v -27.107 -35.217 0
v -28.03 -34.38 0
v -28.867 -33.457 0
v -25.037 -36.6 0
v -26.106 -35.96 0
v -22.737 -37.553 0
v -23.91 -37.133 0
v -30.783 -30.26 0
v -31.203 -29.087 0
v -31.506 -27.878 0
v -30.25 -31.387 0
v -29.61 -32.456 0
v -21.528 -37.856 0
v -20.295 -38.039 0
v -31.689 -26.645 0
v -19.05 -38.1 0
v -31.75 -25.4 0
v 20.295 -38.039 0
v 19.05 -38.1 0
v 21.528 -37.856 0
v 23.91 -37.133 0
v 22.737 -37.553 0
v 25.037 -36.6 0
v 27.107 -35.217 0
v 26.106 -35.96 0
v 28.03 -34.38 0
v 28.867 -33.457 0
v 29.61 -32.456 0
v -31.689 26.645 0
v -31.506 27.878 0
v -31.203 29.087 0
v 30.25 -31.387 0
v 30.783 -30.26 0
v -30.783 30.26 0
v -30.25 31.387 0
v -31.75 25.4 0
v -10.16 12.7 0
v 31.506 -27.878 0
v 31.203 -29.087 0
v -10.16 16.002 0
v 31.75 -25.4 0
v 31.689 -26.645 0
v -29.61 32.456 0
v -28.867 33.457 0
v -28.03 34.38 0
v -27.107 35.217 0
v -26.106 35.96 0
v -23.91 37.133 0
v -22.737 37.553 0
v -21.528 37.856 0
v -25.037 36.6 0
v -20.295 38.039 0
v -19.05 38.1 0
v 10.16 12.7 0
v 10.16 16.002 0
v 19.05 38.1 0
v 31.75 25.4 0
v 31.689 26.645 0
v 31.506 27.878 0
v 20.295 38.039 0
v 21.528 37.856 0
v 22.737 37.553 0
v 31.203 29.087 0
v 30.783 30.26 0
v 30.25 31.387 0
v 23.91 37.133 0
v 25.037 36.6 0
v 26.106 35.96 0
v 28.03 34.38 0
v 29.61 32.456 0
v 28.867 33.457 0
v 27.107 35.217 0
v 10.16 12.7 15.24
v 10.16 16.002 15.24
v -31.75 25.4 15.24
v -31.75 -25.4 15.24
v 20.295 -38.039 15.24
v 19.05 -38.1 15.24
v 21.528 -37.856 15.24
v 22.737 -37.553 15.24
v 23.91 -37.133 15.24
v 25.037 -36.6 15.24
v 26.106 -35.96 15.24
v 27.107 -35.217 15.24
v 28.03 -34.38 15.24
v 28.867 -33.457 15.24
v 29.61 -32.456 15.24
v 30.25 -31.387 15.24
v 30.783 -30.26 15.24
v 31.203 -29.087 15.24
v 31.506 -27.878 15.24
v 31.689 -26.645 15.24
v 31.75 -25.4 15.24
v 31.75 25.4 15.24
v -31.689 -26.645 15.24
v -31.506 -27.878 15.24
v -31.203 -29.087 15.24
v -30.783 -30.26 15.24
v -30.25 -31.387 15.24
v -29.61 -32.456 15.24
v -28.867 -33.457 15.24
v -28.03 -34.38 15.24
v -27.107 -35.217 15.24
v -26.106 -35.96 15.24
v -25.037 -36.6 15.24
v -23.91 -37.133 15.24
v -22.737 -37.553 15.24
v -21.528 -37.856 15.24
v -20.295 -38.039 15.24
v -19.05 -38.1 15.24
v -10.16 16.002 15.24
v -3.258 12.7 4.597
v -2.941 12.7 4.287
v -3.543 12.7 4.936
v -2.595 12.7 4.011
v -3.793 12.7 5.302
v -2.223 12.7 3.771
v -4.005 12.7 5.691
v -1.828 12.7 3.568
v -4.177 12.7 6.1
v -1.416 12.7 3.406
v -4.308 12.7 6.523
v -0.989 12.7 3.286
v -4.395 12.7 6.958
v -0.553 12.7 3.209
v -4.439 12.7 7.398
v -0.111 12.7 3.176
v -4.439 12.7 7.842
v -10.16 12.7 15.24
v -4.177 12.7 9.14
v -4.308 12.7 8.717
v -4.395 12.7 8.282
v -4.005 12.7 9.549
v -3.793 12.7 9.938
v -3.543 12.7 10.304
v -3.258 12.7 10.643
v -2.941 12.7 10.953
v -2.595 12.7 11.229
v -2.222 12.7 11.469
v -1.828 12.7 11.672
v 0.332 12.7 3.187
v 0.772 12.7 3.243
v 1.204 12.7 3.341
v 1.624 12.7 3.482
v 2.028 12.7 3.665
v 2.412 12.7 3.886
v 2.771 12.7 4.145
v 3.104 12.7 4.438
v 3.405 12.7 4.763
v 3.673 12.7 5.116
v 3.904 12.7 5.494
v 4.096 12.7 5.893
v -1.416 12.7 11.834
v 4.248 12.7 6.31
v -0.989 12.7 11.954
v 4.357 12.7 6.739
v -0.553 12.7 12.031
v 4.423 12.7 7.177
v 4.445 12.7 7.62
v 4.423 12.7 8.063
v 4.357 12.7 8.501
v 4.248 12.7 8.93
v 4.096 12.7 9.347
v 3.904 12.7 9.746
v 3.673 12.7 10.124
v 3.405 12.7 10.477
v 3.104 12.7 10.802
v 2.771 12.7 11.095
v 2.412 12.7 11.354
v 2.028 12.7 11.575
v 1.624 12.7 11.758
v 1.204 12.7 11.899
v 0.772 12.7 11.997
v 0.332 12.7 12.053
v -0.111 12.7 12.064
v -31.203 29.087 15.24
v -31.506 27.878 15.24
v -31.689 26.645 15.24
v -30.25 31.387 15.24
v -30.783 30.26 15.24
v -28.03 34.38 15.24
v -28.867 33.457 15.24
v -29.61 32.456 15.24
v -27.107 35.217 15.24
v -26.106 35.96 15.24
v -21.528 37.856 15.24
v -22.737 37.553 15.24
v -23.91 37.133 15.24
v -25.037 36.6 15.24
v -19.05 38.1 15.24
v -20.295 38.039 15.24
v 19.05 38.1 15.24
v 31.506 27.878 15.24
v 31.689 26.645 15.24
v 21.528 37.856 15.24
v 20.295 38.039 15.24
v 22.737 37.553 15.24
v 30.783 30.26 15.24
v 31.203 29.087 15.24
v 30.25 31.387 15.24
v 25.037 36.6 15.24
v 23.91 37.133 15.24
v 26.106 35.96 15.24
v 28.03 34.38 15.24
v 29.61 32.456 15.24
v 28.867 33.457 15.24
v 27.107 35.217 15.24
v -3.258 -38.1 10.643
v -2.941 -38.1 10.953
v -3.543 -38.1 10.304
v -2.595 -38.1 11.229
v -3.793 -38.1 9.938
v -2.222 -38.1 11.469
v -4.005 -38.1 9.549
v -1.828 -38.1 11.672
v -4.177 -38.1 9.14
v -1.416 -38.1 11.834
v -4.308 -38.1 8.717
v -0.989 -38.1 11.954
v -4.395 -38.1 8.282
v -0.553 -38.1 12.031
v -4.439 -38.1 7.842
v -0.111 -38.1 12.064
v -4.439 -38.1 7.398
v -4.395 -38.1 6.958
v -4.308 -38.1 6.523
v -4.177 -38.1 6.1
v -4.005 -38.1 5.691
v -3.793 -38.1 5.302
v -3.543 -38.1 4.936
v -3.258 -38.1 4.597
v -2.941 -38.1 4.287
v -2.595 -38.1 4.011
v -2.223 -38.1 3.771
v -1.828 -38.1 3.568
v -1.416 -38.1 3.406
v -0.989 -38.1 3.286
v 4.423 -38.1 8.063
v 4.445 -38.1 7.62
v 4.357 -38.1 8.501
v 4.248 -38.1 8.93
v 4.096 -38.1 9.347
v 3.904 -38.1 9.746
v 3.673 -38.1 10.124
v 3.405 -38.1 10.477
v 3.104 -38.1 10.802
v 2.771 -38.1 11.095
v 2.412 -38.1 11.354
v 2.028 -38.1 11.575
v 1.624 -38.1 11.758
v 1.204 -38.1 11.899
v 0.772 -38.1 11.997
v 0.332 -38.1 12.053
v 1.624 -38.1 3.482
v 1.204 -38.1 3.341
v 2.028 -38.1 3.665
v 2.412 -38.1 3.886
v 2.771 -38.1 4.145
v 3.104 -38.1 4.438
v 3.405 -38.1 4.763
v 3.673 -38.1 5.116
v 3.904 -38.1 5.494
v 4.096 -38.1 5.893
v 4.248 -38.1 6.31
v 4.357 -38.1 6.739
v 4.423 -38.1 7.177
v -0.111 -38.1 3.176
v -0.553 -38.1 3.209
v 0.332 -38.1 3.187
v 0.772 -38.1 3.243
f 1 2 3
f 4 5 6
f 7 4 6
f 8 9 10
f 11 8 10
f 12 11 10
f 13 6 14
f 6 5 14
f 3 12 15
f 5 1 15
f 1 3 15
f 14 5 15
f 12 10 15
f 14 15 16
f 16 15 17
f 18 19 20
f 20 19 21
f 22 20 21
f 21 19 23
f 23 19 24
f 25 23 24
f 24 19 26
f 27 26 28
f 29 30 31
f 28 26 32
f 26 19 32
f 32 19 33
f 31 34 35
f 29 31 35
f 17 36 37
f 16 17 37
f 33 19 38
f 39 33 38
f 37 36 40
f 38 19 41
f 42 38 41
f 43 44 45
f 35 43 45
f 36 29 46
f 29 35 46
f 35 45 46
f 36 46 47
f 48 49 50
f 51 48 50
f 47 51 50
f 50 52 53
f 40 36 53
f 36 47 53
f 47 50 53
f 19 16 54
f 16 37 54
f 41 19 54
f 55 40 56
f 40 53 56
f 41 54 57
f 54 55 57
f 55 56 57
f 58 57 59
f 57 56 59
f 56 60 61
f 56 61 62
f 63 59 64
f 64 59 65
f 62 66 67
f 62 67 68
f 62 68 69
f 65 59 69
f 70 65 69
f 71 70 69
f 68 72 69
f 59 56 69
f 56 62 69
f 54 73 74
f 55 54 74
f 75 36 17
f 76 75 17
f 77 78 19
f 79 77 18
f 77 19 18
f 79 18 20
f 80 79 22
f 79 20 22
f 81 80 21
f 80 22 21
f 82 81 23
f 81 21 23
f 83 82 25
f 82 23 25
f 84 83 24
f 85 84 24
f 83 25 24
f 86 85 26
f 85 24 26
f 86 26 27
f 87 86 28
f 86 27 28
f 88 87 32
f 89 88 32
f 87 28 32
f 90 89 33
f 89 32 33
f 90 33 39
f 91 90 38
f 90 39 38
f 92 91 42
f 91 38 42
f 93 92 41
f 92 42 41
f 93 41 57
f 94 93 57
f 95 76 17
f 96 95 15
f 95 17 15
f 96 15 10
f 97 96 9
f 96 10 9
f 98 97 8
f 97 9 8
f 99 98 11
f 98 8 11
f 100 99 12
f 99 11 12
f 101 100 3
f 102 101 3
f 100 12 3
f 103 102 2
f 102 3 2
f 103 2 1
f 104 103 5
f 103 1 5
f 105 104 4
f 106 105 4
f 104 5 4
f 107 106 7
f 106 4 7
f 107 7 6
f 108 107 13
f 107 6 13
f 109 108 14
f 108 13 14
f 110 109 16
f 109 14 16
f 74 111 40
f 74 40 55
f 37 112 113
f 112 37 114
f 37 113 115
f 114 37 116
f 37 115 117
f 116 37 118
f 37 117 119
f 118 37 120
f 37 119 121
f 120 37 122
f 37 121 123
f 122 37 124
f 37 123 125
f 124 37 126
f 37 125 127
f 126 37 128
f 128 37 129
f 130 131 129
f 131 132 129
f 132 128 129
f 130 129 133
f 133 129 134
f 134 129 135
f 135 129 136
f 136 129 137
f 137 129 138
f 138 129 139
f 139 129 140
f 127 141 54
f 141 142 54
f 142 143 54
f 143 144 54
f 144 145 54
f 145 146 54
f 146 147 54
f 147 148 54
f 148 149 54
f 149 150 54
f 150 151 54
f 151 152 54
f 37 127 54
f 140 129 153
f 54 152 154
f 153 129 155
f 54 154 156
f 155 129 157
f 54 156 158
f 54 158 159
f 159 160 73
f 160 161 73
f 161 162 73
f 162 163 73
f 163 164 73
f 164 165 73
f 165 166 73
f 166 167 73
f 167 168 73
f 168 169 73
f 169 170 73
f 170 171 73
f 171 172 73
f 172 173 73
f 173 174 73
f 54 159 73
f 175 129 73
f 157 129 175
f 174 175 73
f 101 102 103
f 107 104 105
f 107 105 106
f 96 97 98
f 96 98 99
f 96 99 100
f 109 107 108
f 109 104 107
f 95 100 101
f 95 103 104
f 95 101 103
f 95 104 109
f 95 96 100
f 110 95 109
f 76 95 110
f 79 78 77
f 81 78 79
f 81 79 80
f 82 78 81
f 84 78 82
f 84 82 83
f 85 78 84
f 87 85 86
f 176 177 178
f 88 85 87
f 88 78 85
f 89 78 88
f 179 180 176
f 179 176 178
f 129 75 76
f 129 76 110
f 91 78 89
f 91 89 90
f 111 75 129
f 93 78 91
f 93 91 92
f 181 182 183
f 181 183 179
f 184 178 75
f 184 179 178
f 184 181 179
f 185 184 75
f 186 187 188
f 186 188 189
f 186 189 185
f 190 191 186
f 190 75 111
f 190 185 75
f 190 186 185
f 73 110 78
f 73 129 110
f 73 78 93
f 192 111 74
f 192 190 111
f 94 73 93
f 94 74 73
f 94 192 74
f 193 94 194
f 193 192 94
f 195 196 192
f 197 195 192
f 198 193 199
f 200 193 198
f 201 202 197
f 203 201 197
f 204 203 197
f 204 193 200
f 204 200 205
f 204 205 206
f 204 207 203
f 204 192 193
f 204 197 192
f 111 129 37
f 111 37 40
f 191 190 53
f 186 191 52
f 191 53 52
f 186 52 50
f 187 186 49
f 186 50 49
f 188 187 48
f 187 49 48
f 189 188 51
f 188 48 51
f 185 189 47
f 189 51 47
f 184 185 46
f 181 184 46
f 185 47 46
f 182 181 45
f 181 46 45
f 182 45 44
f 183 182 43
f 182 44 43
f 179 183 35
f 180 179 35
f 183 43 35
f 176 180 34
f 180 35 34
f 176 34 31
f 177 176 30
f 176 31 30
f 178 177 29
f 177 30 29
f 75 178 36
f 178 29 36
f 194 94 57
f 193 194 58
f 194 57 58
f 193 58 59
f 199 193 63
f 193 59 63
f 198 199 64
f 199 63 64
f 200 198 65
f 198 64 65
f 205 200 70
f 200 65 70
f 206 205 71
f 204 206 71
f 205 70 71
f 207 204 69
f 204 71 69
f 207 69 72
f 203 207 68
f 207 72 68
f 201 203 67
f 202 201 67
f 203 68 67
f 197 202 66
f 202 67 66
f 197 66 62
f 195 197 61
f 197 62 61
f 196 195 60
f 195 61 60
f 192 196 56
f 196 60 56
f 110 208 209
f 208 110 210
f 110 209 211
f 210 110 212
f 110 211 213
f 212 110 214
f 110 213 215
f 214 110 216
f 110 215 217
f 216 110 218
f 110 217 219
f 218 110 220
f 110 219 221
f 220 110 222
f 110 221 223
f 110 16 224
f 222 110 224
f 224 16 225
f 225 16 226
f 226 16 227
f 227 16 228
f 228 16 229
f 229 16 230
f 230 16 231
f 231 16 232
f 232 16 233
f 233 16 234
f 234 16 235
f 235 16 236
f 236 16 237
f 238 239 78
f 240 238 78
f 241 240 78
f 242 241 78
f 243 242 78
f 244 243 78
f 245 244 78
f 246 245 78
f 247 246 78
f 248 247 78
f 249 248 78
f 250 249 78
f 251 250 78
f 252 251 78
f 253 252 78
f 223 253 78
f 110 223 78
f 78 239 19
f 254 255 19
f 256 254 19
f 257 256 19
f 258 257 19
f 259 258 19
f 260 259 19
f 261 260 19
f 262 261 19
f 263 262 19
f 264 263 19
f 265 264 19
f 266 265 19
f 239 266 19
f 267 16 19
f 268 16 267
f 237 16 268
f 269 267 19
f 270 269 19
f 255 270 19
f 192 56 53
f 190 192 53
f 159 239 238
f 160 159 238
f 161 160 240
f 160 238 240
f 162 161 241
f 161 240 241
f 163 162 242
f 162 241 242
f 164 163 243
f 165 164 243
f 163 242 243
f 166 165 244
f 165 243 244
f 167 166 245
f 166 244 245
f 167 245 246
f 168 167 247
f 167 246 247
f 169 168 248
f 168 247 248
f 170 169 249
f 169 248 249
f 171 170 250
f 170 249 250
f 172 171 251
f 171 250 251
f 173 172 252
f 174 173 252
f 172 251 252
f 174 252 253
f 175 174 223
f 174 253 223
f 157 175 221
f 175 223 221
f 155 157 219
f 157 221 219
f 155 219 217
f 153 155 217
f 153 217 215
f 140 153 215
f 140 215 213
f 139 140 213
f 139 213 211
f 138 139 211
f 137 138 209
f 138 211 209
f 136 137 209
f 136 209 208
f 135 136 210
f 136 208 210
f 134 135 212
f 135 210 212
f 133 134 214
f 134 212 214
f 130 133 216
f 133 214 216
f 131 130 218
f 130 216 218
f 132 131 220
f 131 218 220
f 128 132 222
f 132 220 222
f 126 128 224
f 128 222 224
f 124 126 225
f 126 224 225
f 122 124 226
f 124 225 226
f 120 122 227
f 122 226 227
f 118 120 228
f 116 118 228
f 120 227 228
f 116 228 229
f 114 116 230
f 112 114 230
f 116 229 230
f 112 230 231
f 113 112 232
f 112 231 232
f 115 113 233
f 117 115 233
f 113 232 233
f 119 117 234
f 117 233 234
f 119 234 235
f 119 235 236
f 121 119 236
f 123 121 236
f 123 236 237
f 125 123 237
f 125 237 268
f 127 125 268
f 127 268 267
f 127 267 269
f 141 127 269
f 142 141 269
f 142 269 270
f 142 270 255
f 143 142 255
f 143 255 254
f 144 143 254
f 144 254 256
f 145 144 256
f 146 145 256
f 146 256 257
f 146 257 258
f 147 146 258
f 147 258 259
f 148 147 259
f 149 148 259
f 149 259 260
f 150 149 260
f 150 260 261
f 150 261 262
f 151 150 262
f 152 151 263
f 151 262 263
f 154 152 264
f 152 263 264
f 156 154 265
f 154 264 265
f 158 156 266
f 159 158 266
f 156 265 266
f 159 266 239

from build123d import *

# Parameters (mm, degrees)
F1_DEPTH = 15.24
F2_R     = 4.445
F3_DEPTH = 50.8
F4_W     = 20.32
F4_H     = 3.302
F5_DEPTH = 15.24


with BuildPart() as f1:
    # F0 (on Top) → F1 (new body)
    with BuildSketch(Plane.XY):
        with BuildLine():
            ThreePointArc((31.75, 25.4), (28.030256, 34.380256), (19.05, 38.1))
            Line((19.05, 38.1), (-19.05, 38.1))
            ThreePointArc((-19.05, 38.1), (-28.030256, 34.380256), (-31.75, 25.4))
            Line((-31.75, 25.4), (-31.75, -25.4))
            ThreePointArc((-31.75, -25.4), (-28.030256, -34.380256), (-19.05, -38.1))
            Line((-19.05, -38.1), (19.05, -38.1))
            ThreePointArc((19.05, -38.1), (28.030256, -34.380256), (31.75, -25.4))
            Line((31.75, -25.4), (31.75, 25.4))
        make_face()
    extrude(amount=F1_DEPTH)

    # F2 (on face) → F3 (cut)
    with BuildSketch(Plane.XZ.offset(38.1)):
        with Locations((0, 7.62)):
            Circle(F2_R)
    extrude(amount=-F3_DEPTH, mode=Mode.SUBTRACT)

    # F4 (on face) → F5 (cut)
    with BuildSketch(Plane.XY.offset(15.24)):
        with Locations((0, 14.351)):
            Rectangle(F4_W, F4_H)
    extrude(amount=-F5_DEPTH, mode=Mode.SUBTRACT)


solid = f1.part
